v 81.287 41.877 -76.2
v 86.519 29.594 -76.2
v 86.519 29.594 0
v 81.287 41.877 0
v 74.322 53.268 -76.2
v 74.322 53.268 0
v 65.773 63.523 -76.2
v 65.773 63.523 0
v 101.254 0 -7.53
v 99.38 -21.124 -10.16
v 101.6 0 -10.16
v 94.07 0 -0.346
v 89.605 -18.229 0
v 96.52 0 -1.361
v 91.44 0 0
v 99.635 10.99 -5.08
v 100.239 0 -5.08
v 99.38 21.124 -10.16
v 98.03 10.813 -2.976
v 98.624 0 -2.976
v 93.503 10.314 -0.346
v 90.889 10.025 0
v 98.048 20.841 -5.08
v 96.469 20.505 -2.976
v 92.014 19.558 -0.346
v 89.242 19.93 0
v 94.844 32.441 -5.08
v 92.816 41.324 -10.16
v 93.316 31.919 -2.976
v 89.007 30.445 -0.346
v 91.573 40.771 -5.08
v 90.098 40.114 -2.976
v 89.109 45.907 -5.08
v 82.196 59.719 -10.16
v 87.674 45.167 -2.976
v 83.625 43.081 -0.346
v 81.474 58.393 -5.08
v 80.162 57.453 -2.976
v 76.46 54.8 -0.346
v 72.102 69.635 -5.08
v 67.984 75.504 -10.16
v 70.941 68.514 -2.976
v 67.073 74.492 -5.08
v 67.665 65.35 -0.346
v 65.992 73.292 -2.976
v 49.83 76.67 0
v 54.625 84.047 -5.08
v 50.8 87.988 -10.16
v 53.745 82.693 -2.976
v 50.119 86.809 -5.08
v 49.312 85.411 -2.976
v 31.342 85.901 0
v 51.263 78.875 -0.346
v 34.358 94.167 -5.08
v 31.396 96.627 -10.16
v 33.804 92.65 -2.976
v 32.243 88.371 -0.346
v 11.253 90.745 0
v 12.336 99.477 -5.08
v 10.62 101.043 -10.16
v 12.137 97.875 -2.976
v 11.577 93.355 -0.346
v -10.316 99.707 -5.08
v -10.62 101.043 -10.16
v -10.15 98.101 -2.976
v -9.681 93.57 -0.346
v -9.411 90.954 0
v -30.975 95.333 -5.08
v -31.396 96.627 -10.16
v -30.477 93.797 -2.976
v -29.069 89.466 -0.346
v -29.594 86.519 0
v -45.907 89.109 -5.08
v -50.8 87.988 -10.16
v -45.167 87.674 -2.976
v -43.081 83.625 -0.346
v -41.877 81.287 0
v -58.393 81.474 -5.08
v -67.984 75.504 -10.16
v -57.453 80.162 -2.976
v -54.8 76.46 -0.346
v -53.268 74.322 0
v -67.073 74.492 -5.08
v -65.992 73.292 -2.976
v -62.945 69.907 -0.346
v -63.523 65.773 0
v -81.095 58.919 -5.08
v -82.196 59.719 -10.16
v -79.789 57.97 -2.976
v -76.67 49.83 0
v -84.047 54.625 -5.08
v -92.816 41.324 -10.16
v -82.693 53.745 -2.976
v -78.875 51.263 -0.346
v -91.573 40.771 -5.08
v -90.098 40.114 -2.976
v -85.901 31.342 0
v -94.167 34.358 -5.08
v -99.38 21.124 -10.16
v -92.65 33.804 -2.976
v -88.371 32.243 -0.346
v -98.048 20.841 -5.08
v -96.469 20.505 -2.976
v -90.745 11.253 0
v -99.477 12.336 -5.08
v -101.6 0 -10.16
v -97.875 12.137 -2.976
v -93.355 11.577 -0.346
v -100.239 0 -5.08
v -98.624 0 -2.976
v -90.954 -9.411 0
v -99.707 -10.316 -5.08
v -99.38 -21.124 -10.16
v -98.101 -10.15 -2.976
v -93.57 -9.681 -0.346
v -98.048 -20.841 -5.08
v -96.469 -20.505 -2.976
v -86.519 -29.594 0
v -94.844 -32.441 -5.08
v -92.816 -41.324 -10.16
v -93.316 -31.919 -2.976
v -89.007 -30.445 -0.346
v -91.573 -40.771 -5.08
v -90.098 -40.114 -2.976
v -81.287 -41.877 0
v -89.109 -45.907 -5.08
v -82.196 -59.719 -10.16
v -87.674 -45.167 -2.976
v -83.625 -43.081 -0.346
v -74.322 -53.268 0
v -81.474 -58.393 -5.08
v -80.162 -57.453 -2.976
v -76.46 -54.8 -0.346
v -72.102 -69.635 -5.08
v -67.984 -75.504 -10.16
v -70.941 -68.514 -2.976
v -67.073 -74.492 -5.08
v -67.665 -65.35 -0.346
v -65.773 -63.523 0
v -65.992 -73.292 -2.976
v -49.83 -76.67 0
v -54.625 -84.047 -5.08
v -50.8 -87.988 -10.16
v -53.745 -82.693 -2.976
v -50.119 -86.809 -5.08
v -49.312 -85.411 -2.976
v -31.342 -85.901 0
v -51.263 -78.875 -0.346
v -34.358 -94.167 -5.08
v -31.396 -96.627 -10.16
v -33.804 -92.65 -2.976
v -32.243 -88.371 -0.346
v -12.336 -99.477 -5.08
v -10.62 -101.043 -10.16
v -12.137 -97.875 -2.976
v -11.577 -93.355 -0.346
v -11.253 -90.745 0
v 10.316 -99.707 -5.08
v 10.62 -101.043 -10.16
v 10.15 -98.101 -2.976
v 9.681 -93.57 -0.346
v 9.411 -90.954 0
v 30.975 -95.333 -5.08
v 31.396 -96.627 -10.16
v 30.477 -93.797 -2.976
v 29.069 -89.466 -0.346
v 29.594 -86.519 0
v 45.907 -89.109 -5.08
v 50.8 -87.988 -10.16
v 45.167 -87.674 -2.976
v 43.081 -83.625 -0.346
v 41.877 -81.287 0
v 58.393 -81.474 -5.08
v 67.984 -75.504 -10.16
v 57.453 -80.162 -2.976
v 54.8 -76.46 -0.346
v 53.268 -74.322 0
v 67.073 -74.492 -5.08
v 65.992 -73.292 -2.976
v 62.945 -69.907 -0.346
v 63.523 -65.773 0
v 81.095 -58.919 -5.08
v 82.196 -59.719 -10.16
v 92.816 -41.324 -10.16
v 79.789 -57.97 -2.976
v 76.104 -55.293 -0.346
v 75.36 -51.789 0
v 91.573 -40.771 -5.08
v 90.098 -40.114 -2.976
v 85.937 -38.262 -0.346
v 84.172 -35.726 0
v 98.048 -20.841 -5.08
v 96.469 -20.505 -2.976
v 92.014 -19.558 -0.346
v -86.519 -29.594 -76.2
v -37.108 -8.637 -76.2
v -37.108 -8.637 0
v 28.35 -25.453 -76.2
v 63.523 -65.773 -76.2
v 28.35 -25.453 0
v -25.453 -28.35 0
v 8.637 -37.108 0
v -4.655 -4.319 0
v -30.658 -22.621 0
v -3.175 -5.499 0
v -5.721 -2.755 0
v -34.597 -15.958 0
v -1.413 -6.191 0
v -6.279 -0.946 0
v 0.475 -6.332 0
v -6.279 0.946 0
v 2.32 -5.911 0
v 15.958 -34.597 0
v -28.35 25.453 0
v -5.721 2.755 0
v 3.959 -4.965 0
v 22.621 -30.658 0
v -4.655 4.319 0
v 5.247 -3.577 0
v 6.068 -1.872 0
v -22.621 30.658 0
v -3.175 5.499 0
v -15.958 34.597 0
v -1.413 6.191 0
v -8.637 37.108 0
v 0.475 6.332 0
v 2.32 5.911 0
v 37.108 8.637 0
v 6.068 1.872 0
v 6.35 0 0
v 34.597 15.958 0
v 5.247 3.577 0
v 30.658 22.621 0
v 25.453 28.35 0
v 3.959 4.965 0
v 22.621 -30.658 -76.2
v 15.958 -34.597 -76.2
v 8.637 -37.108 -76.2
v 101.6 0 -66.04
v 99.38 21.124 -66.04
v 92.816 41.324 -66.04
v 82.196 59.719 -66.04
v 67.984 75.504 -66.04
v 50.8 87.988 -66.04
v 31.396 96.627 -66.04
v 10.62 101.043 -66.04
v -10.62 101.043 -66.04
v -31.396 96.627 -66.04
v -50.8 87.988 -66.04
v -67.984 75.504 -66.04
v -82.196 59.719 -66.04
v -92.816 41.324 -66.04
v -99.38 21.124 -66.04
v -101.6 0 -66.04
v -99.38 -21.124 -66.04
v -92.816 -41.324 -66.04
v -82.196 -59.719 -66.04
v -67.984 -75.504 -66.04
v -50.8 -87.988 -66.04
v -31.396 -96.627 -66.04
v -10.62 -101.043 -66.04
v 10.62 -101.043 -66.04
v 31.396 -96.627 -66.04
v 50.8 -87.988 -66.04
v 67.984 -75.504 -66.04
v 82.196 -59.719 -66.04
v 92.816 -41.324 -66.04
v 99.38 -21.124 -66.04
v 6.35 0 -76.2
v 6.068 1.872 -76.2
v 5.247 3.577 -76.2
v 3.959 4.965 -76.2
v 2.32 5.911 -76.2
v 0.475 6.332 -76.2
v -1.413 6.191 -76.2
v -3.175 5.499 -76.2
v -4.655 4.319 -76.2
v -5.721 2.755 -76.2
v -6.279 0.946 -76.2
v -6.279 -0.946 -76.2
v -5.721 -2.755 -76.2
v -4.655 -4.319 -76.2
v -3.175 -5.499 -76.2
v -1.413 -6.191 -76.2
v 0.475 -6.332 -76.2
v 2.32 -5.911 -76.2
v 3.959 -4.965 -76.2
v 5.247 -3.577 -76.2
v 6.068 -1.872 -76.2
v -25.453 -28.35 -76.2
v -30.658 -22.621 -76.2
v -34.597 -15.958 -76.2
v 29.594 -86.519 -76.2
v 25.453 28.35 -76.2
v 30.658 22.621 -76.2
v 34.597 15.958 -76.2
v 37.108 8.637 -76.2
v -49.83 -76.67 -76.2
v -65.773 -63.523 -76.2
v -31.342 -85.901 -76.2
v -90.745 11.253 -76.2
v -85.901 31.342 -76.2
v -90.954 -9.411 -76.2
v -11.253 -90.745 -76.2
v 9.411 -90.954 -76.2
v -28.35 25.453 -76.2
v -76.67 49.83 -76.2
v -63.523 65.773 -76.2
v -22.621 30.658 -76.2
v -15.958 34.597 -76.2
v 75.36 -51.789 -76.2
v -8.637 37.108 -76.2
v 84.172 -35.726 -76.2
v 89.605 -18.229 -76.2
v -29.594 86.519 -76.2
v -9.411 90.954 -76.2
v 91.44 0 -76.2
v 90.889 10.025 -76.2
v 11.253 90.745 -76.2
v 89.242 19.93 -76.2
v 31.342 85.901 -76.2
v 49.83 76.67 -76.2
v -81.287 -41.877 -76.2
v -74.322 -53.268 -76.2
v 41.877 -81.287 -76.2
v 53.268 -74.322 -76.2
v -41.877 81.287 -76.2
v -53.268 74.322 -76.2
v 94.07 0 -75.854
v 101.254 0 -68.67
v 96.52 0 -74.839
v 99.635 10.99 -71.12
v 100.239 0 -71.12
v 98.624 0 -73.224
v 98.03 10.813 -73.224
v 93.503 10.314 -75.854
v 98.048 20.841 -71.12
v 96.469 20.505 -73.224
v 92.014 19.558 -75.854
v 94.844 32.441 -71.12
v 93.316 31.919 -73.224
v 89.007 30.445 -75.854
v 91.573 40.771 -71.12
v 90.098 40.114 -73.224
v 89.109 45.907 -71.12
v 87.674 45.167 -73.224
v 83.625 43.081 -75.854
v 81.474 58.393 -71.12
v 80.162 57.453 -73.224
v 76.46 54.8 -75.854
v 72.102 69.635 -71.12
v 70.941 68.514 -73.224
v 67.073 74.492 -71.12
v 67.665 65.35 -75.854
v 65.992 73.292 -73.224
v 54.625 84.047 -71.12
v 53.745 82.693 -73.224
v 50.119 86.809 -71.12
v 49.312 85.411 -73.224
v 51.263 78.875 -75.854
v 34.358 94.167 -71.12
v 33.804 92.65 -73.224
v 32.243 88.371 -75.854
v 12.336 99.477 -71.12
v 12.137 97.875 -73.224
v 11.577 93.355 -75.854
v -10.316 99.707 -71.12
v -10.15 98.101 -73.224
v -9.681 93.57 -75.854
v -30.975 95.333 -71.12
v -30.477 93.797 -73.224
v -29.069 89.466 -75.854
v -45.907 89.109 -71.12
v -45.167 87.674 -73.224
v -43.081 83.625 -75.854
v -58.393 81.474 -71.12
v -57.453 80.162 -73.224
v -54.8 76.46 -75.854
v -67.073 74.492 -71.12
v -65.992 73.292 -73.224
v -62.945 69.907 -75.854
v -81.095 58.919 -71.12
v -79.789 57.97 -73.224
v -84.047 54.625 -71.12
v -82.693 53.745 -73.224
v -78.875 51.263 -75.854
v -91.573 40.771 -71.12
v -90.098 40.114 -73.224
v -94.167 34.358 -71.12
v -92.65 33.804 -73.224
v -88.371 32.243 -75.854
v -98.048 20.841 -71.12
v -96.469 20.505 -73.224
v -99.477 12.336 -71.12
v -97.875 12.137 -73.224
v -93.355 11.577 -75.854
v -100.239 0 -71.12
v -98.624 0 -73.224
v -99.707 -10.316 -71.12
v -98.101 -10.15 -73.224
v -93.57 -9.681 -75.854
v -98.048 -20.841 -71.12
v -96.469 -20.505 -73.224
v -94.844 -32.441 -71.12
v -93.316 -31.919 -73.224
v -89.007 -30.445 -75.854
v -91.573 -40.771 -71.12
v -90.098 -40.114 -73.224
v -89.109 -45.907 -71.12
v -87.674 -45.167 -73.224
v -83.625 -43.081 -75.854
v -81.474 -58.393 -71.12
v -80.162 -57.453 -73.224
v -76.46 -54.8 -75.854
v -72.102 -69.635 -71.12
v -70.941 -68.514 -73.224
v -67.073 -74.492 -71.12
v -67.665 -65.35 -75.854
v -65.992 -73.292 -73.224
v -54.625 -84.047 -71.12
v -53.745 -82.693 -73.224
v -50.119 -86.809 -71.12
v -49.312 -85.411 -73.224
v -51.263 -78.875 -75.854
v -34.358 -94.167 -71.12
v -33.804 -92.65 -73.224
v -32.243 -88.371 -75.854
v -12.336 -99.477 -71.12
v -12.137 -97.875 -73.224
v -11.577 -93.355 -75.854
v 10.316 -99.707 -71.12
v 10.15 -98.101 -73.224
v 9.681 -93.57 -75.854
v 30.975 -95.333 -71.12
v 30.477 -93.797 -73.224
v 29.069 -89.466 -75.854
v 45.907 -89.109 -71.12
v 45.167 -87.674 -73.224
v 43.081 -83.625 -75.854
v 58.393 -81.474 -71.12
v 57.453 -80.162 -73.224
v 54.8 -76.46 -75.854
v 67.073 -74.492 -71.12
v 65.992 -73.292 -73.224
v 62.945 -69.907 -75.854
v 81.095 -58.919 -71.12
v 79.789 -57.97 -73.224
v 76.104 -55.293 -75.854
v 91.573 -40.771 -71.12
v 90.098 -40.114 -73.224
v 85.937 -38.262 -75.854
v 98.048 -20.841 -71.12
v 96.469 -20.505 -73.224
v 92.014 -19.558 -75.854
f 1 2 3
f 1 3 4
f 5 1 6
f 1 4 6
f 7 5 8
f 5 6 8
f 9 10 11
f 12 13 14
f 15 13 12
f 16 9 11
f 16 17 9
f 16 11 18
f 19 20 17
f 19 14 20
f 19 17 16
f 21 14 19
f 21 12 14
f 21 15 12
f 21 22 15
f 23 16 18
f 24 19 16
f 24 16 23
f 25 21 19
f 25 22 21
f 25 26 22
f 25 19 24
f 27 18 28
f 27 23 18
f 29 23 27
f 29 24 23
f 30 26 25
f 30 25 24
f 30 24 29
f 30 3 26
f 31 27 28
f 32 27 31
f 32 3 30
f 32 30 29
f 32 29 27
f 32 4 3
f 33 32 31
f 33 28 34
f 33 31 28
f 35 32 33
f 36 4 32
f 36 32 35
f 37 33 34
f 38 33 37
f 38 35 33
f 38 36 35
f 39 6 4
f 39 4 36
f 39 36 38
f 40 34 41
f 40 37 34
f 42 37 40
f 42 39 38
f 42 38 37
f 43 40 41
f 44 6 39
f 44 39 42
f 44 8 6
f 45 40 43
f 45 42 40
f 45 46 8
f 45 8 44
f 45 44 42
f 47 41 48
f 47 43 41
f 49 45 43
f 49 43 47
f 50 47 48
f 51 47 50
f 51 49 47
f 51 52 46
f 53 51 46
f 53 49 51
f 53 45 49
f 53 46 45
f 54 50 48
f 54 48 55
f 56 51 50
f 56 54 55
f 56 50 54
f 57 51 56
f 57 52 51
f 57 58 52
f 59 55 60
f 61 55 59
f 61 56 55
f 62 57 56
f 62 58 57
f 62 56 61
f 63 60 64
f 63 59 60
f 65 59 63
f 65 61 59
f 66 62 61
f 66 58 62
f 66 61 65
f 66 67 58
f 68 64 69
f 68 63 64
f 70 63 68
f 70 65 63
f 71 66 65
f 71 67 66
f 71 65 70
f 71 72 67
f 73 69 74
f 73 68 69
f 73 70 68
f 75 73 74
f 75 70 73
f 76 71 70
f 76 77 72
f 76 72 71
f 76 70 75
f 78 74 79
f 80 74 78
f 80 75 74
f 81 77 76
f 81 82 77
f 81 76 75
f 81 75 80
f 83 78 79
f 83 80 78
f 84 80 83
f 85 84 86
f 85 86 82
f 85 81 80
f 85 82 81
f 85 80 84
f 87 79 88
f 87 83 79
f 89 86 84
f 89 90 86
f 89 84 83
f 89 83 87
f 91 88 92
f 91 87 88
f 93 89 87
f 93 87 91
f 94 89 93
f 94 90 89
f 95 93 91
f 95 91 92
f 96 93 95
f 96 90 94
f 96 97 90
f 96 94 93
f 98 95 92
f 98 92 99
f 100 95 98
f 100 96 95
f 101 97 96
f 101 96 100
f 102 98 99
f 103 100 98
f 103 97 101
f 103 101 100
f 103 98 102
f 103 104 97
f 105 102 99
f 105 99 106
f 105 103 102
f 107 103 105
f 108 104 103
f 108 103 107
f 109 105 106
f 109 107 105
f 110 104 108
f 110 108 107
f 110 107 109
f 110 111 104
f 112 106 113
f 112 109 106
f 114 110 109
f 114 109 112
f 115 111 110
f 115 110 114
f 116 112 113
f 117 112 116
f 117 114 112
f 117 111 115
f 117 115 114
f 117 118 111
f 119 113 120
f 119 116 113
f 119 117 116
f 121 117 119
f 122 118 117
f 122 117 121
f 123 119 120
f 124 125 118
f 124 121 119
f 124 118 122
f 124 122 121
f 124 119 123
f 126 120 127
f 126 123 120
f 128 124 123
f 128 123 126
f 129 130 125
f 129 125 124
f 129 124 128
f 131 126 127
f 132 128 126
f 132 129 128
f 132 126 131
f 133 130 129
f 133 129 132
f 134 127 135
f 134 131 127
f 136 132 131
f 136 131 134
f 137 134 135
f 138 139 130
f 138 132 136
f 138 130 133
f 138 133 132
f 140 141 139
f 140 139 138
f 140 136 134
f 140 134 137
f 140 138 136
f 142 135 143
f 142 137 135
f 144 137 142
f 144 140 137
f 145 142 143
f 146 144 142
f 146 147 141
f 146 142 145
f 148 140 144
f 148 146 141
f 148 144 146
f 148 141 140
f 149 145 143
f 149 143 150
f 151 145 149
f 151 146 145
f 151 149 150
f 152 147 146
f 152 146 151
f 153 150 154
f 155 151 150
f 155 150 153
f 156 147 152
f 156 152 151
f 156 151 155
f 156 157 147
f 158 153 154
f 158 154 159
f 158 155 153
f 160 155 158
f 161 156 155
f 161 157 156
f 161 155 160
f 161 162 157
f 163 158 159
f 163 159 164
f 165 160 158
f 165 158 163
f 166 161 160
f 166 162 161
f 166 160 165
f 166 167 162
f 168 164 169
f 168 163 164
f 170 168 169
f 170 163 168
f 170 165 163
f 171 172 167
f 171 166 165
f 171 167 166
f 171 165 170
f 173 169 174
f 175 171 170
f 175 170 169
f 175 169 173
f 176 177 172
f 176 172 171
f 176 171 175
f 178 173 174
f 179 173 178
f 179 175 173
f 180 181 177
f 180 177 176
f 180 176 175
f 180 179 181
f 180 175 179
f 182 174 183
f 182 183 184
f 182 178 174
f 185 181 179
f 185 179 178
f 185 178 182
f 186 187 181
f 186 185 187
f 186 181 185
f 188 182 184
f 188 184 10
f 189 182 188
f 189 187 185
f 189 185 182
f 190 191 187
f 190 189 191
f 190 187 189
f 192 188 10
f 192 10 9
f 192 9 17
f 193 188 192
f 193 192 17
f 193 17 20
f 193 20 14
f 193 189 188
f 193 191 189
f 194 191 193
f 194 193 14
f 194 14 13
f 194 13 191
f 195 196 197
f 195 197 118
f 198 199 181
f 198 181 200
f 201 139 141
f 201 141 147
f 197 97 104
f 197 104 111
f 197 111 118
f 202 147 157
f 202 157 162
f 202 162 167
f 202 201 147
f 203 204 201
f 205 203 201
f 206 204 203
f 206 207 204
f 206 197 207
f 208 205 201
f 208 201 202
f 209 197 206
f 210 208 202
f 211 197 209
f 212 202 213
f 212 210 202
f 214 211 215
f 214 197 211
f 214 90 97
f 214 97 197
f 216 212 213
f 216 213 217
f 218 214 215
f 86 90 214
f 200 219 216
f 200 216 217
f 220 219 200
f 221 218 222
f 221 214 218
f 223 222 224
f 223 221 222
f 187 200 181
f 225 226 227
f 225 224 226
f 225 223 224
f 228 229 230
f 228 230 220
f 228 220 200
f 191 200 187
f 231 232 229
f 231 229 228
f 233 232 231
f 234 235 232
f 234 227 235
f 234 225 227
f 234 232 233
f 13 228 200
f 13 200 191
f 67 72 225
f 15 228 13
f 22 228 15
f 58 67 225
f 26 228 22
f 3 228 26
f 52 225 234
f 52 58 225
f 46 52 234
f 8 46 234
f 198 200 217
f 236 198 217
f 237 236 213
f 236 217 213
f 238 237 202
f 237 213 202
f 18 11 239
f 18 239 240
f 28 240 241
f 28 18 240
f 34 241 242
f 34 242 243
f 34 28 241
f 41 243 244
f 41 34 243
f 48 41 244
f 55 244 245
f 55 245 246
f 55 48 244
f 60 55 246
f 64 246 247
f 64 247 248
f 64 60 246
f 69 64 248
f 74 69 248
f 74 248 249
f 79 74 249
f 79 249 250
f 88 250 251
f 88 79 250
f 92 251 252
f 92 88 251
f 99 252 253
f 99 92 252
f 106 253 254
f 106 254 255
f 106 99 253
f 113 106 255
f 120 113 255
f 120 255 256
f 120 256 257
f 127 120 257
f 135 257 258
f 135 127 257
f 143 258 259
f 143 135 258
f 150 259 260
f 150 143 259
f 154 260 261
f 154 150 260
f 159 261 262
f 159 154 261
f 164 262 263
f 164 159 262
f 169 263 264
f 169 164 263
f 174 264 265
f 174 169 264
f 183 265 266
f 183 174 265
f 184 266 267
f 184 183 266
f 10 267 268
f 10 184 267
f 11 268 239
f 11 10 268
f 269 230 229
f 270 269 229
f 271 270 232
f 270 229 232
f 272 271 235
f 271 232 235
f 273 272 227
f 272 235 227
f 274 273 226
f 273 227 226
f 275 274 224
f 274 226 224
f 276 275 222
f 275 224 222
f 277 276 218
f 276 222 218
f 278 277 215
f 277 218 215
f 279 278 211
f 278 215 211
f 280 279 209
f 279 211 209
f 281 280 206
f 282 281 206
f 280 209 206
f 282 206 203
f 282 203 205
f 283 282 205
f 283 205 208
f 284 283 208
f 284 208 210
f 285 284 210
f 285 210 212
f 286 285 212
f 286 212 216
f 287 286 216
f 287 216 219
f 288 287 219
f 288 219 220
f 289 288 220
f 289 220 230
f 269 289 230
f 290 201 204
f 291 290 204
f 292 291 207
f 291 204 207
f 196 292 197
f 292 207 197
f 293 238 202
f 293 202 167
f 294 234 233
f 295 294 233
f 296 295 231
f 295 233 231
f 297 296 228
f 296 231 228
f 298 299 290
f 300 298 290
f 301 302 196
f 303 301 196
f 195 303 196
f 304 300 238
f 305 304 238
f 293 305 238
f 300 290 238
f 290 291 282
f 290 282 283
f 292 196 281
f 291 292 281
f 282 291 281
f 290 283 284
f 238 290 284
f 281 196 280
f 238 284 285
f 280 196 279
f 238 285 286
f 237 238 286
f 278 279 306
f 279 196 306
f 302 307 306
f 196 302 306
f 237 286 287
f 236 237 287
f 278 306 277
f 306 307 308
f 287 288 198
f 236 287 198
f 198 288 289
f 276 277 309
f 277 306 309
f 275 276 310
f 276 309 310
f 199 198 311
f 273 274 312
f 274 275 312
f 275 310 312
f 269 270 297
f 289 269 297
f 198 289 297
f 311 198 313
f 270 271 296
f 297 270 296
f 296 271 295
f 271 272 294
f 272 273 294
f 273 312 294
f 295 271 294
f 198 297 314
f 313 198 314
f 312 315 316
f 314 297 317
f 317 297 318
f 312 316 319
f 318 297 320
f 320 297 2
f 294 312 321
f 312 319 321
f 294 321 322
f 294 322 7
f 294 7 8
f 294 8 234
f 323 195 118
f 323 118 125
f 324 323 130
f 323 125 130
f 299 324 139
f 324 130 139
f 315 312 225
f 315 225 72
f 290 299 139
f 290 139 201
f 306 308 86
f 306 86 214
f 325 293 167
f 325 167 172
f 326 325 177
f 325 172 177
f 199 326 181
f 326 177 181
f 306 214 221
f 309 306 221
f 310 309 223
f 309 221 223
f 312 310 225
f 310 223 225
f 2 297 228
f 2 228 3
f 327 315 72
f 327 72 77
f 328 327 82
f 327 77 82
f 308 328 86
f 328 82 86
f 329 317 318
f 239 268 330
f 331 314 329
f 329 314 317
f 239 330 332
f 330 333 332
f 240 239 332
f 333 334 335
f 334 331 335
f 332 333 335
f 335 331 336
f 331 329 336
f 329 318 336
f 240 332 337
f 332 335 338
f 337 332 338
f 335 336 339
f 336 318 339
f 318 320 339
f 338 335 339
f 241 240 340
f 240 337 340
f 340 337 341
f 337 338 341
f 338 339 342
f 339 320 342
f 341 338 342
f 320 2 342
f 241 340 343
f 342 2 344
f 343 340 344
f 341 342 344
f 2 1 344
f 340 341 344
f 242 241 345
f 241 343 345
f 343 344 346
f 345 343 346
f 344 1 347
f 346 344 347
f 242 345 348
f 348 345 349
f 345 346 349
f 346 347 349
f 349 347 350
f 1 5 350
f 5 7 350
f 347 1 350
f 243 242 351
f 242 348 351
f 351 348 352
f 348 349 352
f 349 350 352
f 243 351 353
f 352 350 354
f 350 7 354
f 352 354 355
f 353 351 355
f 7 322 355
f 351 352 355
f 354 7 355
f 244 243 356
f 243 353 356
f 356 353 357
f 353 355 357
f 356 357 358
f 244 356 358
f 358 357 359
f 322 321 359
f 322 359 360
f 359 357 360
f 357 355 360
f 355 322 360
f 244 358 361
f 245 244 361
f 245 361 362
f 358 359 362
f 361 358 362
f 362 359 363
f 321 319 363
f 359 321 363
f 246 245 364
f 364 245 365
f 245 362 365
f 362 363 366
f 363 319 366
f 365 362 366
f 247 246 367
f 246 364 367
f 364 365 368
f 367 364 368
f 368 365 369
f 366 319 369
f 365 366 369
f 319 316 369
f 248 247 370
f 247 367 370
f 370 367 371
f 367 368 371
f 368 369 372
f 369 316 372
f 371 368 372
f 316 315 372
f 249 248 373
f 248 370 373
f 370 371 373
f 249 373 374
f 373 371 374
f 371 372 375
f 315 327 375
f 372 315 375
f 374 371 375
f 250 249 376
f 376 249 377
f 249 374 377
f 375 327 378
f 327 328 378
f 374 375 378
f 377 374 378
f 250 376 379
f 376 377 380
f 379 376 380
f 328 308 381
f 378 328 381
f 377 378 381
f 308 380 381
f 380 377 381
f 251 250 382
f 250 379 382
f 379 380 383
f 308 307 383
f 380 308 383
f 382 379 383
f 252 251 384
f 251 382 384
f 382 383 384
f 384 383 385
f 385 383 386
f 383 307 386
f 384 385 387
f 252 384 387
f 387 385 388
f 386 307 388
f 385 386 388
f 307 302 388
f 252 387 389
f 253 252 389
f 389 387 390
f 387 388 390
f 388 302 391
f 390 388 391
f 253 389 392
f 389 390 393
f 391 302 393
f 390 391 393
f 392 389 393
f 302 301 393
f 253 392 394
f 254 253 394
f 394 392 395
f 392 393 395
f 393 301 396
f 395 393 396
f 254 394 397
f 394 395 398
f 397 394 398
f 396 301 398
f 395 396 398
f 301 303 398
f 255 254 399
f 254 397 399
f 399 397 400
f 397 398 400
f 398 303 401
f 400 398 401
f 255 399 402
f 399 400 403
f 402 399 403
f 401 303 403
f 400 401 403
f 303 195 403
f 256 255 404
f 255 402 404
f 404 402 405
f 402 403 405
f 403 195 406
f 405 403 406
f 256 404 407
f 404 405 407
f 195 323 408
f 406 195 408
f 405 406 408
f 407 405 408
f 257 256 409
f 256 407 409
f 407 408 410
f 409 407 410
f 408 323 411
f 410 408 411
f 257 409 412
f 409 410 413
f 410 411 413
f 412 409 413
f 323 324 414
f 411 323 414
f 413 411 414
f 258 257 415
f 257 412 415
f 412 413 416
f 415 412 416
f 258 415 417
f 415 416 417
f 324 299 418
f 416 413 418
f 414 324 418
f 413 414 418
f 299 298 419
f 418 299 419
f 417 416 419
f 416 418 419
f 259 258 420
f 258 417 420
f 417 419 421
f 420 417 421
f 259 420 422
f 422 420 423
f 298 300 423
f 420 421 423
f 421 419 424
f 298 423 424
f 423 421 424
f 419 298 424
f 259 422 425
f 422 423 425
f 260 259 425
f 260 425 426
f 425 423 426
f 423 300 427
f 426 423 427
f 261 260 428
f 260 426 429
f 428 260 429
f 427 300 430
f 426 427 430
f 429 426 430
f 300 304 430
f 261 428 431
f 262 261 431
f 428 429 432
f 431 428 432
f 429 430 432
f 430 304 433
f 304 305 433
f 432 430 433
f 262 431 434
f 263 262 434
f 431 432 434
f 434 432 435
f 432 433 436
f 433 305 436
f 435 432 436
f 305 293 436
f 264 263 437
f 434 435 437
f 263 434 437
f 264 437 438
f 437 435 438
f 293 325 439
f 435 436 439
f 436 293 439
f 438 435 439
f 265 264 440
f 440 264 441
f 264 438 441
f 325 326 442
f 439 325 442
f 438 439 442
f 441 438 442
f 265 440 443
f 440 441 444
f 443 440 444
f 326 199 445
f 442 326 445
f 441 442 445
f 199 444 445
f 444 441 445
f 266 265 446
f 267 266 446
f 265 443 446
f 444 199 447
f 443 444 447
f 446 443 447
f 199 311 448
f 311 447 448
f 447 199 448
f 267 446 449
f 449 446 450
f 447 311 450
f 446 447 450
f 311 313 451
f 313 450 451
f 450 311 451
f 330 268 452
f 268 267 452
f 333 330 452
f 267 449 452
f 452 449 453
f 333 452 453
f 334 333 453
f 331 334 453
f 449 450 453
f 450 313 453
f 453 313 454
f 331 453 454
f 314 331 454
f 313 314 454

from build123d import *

# Parameters (mm, degrees)
SKETCH2_R           = 101.6
BOSS_EXTRUDE1_DEPTH = 76.2
FILLET1_R           = 10.16
CUT_EXTRUDE1_REACH  = 164.639
SKETCH3_R           = 6.35
CUT_EXTRUDE2_REACH  = 164.639


with BuildPart() as part:
    # Sketch2 → Boss-Extrude1 (new body)
    with BuildSketch(Plane.XY):
        Circle(SKETCH2_R)
    extrude(amount=-BOSS_EXTRUDE1_DEPTH)

    # Fillet1
    fillet1_edges = [part.edges().sort_by_distance(p)[0] for p in [
        (-101.6, 0, 0),
        (-101.6, 0, -76.2),
    ]]
    fillet(fillet1_edges, radius=FILLET1_R)

    # Sketch3 → Cut-Extrude1 (cut, up to next)
    with BuildSketch(Plane.XY, mode=Mode.PRIVATE) as cut_extrude1_sk1:
        Circle(SKETCH3_R)
    cut_extrude1_tool1 = extrude(cut_extrude1_sk1.sketch, amount=-CUT_EXTRUDE1_REACH, mode=Mode.PRIVATE) & part.part
    add(cut_extrude1_tool1.solids().sort_by_distance((0, 0, 0))[0], mode=Mode.SUBTRACT)

    # Sketch5 → Cut-Extrude2 (cut, up to next)
    with BuildSketch(Plane.XY, mode=Mode.PRIVATE) as cut_extrude2_sk1:
        with BuildLine():
            Line((65.773312704, 63.522790682), (25.453227454, 28.350365292))
            ThreePointArc((25.453227454, 28.350365292), (32.796836191, 19.390140171), (37.108086442, 8.637124558))
            Line((37.108086442, 8.637124558), (86.518715929, 29.593671518))
            ThreePointArc((86.518715929, 29.593671518), (78.012894947, 47.699704631), (65.773312704, 63.522790682))
        make_face()
    cut_extrude2_tool1 = extrude(cut_extrude2_sk1.sketch, amount=-CUT_EXTRUDE2_REACH, mode=Mode.PRIVATE) & part.part
    # Sketch5 → Cut-Extrude2 (cut, up to next)
    with BuildSketch(Plane.XY, mode=Mode.PRIVATE) as cut_extrude2_sk2:
        with BuildLine():
            Line((63.522790682, -65.773312704), (28.350365292, -25.453227454))
            ThreePointArc((28.350365292, -25.453227454), (19.390140171, -32.796836191), (8.637124558, -37.108086442))
            Line((8.637124558, -37.108086442), (29.593671518, -86.518715929))
            ThreePointArc((29.593671518, -86.518715929), (47.699704631, -78.012894947), (63.522790682, -65.773312704))
        make_face()
    cut_extrude2_tool2 = extrude(cut_extrude2_sk2.sketch, amount=-CUT_EXTRUDE2_REACH, mode=Mode.PRIVATE) & part.part
    # Sketch5 → Cut-Extrude2 (cut, up to next)
    with BuildSketch(Plane.XY, mode=Mode.PRIVATE) as cut_extrude2_sk3:
        with BuildLine():
            Line((-65.773312704, -63.522790682), (-25.453227454, -28.350365292))
            ThreePointArc((-25.453227454, -28.350365292), (-32.796836191, -19.390140171), (-37.108086442, -8.637124558))
            Line((-37.108086442, -8.637124558), (-86.518715929, -29.593671518))
            ThreePointArc((-86.518715929, -29.593671518), (-78.012894947, -47.699704631), (-65.773312704, -63.522790682))
        make_face()
    cut_extrude2_tool3 = extrude(cut_extrude2_sk3.sketch, amount=-CUT_EXTRUDE2_REACH, mode=Mode.PRIVATE) & part.part
    # Sketch5 → Cut-Extrude2 (cut, up to next)
    with BuildSketch(Plane.XY, mode=Mode.PRIVATE) as cut_extrude2_sk4:
        with BuildLine():
            Line((-63.522790682, 65.773312704), (-28.350365292, 25.453227454))
            ThreePointArc((-28.350365292, 25.453227454), (-19.390140171, 32.796836191), (-8.637124558, 37.108086442))
            Line((-8.637124558, 37.108086442), (-29.593671518, 86.518715929))
            ThreePointArc((-29.593671518, 86.518715929), (-47.699704631, 78.012894947), (-63.522790682, 65.773312704))
        make_face()
    cut_extrude2_tool4 = extrude(cut_extrude2_sk4.sketch, amount=-CUT_EXTRUDE2_REACH, mode=Mode.PRIVATE) & part.part
    add(cut_extrude2_tool1.solids().sort_by_distance((56.84773, 34.461957, 0))[0], mode=Mode.SUBTRACT)
    add(cut_extrude2_tool2.solids().sort_by_distance((34.461957, -56.84773, 0))[0], mode=Mode.SUBTRACT)
    add(cut_extrude2_tool3.solids().sort_by_distance((-56.84773, -34.461957, 0))[0], mode=Mode.SUBTRACT)
    add(cut_extrude2_tool4.solids().sort_by_distance((-34.461957, 56.84773, 0))[0], mode=Mode.SUBTRACT)


solid = part.part
